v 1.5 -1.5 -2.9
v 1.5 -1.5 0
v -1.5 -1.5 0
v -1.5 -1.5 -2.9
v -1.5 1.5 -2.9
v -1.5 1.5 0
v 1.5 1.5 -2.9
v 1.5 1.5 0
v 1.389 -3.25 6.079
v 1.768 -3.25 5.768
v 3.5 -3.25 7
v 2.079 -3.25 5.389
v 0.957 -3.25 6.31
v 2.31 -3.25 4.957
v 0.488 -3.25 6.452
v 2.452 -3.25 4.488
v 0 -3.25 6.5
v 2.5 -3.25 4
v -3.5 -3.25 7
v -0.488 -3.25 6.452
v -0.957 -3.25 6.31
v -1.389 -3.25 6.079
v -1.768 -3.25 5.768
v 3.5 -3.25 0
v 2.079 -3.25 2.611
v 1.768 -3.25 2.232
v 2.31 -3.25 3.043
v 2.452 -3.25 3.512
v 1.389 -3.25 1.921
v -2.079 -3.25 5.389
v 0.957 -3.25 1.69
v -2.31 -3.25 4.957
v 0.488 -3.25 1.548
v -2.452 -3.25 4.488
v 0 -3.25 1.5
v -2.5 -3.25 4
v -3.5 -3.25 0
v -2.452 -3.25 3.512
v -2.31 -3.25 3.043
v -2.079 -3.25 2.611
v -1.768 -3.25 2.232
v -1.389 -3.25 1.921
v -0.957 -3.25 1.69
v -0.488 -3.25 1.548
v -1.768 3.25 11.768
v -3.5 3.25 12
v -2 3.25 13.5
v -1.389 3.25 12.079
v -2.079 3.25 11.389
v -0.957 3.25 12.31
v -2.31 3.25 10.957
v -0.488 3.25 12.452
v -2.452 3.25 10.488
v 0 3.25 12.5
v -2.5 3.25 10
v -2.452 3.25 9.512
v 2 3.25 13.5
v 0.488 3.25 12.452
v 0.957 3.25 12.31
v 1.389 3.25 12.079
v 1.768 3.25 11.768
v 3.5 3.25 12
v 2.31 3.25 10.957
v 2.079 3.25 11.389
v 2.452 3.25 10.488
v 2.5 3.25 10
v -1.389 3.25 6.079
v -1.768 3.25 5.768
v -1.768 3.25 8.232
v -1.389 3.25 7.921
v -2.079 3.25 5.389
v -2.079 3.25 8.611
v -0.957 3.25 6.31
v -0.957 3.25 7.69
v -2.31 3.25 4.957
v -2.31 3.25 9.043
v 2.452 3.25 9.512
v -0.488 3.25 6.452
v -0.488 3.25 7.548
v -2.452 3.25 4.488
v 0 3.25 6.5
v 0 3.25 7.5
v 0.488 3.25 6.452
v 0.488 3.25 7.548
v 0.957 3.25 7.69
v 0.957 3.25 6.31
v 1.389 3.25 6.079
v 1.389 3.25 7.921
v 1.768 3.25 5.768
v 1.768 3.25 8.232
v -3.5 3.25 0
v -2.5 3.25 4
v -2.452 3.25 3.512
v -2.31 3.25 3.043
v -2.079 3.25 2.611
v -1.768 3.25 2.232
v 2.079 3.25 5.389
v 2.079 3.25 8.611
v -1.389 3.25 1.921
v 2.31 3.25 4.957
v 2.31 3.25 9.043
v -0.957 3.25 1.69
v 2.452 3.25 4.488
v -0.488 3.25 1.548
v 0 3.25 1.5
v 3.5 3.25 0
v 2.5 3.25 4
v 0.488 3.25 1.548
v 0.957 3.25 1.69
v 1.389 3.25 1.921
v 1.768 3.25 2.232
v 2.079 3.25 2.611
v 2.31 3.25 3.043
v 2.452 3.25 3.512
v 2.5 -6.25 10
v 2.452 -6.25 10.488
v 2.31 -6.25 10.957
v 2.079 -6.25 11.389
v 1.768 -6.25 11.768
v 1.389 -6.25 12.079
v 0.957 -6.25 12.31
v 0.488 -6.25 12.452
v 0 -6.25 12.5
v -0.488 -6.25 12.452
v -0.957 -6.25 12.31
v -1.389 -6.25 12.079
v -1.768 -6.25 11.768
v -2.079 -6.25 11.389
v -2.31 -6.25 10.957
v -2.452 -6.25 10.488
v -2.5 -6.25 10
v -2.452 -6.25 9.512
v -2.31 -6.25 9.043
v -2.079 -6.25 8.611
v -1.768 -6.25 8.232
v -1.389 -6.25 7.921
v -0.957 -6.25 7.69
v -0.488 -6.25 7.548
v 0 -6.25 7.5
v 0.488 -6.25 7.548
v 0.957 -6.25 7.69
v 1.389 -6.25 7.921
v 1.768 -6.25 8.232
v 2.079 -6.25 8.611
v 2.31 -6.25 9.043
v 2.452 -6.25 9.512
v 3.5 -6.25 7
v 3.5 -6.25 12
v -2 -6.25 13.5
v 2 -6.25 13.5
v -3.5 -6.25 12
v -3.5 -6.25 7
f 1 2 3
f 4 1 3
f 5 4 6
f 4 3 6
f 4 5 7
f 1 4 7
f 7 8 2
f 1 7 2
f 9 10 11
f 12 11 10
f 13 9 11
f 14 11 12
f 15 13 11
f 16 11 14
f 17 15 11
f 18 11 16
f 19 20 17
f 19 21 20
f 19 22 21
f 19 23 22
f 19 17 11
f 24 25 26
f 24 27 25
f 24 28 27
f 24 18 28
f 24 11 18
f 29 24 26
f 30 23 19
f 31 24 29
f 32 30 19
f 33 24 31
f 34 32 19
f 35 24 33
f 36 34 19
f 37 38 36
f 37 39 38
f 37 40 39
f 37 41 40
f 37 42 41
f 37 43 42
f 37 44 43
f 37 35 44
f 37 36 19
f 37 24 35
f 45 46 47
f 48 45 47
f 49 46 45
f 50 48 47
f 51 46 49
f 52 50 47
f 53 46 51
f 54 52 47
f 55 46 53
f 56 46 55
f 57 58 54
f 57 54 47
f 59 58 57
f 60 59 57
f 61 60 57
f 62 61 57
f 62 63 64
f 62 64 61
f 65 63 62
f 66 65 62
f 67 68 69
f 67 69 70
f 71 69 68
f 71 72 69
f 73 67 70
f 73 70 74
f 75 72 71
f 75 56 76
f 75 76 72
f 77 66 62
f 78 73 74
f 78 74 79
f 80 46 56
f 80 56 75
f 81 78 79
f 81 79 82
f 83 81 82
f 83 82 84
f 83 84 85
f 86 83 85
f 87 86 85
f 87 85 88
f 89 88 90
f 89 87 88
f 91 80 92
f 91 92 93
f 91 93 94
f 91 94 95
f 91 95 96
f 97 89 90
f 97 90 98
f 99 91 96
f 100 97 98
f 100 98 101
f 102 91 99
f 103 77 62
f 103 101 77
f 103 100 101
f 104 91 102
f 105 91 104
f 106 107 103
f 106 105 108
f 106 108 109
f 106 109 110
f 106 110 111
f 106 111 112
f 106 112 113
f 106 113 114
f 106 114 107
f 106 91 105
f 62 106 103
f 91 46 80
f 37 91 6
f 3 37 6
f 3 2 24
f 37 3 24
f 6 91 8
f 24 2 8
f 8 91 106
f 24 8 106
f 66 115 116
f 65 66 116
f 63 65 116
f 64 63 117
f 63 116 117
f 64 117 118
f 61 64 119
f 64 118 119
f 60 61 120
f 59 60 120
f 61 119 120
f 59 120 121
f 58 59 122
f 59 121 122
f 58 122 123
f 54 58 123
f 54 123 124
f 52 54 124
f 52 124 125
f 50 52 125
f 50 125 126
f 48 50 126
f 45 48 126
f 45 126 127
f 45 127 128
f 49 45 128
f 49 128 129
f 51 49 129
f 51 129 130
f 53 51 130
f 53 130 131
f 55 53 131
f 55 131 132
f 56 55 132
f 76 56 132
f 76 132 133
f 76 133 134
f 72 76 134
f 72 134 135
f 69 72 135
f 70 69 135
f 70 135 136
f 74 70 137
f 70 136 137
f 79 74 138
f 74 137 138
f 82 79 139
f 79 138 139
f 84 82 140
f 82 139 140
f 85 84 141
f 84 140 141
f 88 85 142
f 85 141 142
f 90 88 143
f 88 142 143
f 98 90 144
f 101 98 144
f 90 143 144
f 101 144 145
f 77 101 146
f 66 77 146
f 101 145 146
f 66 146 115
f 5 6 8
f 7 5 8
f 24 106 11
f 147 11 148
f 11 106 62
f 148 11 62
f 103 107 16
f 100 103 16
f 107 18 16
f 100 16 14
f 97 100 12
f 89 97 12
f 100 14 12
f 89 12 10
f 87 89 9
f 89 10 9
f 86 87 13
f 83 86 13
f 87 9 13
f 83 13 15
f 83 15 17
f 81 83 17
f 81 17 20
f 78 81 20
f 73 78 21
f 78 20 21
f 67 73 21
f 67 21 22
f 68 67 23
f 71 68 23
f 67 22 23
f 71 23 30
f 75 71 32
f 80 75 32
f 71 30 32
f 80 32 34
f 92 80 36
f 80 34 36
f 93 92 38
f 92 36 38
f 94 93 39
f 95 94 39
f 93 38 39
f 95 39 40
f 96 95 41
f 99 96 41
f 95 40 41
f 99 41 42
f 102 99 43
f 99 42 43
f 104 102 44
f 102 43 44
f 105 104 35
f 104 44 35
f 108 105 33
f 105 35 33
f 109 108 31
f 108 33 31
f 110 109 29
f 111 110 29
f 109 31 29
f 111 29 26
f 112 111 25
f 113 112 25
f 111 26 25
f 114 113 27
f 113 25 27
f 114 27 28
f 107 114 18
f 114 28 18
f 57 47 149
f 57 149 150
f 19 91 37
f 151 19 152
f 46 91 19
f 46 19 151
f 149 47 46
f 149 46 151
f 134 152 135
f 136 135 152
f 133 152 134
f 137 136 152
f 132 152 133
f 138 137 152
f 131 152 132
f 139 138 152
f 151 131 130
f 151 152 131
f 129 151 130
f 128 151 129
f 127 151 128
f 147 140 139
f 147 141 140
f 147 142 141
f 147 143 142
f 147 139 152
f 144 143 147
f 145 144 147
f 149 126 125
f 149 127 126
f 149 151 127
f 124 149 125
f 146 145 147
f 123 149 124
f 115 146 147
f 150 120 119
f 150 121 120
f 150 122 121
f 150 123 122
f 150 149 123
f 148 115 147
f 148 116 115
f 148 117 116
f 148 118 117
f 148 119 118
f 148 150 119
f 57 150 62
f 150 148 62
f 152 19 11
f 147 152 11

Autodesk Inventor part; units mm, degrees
ref_plane "YZ Plane" through (0, 0, 0) normal (1, 0, 0) x (0, 1, 0)
ref_plane "XZ Plane" through (0, 0, 0) normal (0, 1, 0) x (-1, 0, 0)
ref_plane "XY Plane" through (0, 0, 0) normal (0, 0, 1) x (1, 0, 0)
sketch "スケッチ1" plane through (0, 0, 0) normal (0, 0, 1) x (1, 0, 0)
  line L0 (-3.5, 3.25) -> (3.5, 3.25)
  line L1 (3.5, 3.25) -> (3.5, -3.25)
  line L2 (3.5, -3.25) -> (-3.5, -3.25)
  line L3 (-3.5, -3.25) -> (-3.5, 3.25)
  line L4 (-3.5, 3.25) -> (3.5, -3.25) construction
  line L5 (3.5, 3.25) -> (-3.5, -3.25) construction
  line L6 (-2.5, 3.25) -> (-2.5, -3.25) construction
  line L7 (2.5, 3.25) -> (2.5, -3.25) construction
  line L8 (0, 0) -> (0, 0.4773) construction
  line L9 (0, 0) -> (0.5273, 0) construction
  line L10 (-1.5, 1.5) -> (1.5, 1.5)
  line L11 (1.5, 1.5) -> (1.5, -1.5)
  line L12 (1.5, -1.5) -> (-1.5, -1.5)
  line L13 (-1.5, -1.5) -> (-1.5, 1.5)
  line L14 (-1.5, 1.5) -> (1.5, -1.5) construction
  line L15 (1.5, 1.5) -> (-1.5, -1.5) construction
  circle A0 centre (0, 0) radius 0.8
  dimension "d0" = 7
  dimension "d1" = 6.5
  dimension "d2" = 5
  dimension "d22" = 3
  dimension "d23" = 3
  dimension "d24" = 1.6
extrude "押し出し1" add sketch "スケッチ1" along normal blind 13.5 contours L0 L1 L2 L3 | L10 L11 L12 L13 | A0
ref_plane "作業平面1" through (-3.5, -3.25, 0) normal (0, -1, 0) x (1, 0, 0)
sketch "スケッチ2" plane through (-3.5, -3.25, 0) normal (0, -1, 0) x (1, 0, 0)
  line L0 (0, 0) -> (7, 0) projected
  line L1 (7, 0) -> (7, 13.5) projected
  line L2 (0, 13.5) -> (7, 13.5) projected
  line L3 (0, 0) -> (0, 13.5) projected
  line L4 (0, 0) -> (0, 13.5) projected
  line L5 (7, 0) -> (7, 13.5) projected
  line L6 (0, 0) -> (7, 0) projected
  line L7 (0, 0) -> (0, 13.5) projected
  line L8 (0, 1.5) -> (7, 1.5) construction
  line L9 (0, 6.5) -> (7, 6.5) construction
  line L10 (7, 0) -> (7, 13.5) projected
  line L11 (0, 6.5) -> (7, 1.5) construction
  line L12 (7, 6.5) -> (0, 1.5) construction
  circle A0 centre (3.5, 4) radius 2.5
  line L13 (0, 7) -> (7, 7)
  line L14 (0, 7) -> (0, 13.5)
  line L15 (0, 13.5) -> (7, 13.5) projected
  line L16 (7, 13.5) -> (7, 7)
  line L17 (7, 13.5) -> (0, 13.5)
  point P0 (3.5, 0)
  point P1 (0, 7)
  point P2 (7, 7)
  dimension "d8" = 1.5
  dimension "d9" = 5
  dimension "d10" = 5
  dimension "d11" = 0.5
extrude "押し出し2" add sketch "スケッチ2" along normal blind 3 contours L3 L2 L1 L13
ref_plane "作業平面2" through (-3.5, -6.25, 0) normal (0, -1, 0) x (1, 0, 0)
sketch "スケッチ3" plane through (-3.5, -6.25, 0) normal (0, -1, 0) x (1, 0, 0)
  line L0 (7, 7) -> (7, 13.5) projected
  line L1 (7, 13.5) -> (0, 13.5) projected
  line L2 (0, 13.5) -> (0, 7) projected
  line L3 (0, 7) -> (7, 7) projected
  line L4 (0, 0) -> (0, 13.5) projected
  line L5 (7, 7) -> (7, 13.5) projected
  line L6 (0, 7) -> (7, 7) projected
  line L7 (0, 7.5) -> (7, 7.5) construction
  line L8 (7, 0) -> (7, 13.5) projected
  line L9 (0, 12.5) -> (7, 12.5) construction
  line L10 (0, 12.5) -> (7, 7.5) construction
  line L11 (7, 12.5) -> (0, 7.5) construction
  circle A0 centre (3.5, 10) radius 2.5
  point P0 (3.5, 0)
  dimension "d15" = 0.5
  dimension "d16" = 1
  dimension "d17" = 5
extrude "押し出し3" cut sketch "スケッチ3" against normal up to surface (9.5 mm away) contours A0
extrude "押し出し4" cut sketch "スケッチ2" against normal blind 10 contours A0
extrude "押し出し5" add sketch "スケッチ1" against normal blind 2.9 contours L10 L11 L12 L13 | A0
chamfer "面取り1" distance 1.5 angle 45 2 edges at (3.5, -1.5, 13.5) (-3.5, -1.5, 13.5)
properties part number "sensorholder_2"
